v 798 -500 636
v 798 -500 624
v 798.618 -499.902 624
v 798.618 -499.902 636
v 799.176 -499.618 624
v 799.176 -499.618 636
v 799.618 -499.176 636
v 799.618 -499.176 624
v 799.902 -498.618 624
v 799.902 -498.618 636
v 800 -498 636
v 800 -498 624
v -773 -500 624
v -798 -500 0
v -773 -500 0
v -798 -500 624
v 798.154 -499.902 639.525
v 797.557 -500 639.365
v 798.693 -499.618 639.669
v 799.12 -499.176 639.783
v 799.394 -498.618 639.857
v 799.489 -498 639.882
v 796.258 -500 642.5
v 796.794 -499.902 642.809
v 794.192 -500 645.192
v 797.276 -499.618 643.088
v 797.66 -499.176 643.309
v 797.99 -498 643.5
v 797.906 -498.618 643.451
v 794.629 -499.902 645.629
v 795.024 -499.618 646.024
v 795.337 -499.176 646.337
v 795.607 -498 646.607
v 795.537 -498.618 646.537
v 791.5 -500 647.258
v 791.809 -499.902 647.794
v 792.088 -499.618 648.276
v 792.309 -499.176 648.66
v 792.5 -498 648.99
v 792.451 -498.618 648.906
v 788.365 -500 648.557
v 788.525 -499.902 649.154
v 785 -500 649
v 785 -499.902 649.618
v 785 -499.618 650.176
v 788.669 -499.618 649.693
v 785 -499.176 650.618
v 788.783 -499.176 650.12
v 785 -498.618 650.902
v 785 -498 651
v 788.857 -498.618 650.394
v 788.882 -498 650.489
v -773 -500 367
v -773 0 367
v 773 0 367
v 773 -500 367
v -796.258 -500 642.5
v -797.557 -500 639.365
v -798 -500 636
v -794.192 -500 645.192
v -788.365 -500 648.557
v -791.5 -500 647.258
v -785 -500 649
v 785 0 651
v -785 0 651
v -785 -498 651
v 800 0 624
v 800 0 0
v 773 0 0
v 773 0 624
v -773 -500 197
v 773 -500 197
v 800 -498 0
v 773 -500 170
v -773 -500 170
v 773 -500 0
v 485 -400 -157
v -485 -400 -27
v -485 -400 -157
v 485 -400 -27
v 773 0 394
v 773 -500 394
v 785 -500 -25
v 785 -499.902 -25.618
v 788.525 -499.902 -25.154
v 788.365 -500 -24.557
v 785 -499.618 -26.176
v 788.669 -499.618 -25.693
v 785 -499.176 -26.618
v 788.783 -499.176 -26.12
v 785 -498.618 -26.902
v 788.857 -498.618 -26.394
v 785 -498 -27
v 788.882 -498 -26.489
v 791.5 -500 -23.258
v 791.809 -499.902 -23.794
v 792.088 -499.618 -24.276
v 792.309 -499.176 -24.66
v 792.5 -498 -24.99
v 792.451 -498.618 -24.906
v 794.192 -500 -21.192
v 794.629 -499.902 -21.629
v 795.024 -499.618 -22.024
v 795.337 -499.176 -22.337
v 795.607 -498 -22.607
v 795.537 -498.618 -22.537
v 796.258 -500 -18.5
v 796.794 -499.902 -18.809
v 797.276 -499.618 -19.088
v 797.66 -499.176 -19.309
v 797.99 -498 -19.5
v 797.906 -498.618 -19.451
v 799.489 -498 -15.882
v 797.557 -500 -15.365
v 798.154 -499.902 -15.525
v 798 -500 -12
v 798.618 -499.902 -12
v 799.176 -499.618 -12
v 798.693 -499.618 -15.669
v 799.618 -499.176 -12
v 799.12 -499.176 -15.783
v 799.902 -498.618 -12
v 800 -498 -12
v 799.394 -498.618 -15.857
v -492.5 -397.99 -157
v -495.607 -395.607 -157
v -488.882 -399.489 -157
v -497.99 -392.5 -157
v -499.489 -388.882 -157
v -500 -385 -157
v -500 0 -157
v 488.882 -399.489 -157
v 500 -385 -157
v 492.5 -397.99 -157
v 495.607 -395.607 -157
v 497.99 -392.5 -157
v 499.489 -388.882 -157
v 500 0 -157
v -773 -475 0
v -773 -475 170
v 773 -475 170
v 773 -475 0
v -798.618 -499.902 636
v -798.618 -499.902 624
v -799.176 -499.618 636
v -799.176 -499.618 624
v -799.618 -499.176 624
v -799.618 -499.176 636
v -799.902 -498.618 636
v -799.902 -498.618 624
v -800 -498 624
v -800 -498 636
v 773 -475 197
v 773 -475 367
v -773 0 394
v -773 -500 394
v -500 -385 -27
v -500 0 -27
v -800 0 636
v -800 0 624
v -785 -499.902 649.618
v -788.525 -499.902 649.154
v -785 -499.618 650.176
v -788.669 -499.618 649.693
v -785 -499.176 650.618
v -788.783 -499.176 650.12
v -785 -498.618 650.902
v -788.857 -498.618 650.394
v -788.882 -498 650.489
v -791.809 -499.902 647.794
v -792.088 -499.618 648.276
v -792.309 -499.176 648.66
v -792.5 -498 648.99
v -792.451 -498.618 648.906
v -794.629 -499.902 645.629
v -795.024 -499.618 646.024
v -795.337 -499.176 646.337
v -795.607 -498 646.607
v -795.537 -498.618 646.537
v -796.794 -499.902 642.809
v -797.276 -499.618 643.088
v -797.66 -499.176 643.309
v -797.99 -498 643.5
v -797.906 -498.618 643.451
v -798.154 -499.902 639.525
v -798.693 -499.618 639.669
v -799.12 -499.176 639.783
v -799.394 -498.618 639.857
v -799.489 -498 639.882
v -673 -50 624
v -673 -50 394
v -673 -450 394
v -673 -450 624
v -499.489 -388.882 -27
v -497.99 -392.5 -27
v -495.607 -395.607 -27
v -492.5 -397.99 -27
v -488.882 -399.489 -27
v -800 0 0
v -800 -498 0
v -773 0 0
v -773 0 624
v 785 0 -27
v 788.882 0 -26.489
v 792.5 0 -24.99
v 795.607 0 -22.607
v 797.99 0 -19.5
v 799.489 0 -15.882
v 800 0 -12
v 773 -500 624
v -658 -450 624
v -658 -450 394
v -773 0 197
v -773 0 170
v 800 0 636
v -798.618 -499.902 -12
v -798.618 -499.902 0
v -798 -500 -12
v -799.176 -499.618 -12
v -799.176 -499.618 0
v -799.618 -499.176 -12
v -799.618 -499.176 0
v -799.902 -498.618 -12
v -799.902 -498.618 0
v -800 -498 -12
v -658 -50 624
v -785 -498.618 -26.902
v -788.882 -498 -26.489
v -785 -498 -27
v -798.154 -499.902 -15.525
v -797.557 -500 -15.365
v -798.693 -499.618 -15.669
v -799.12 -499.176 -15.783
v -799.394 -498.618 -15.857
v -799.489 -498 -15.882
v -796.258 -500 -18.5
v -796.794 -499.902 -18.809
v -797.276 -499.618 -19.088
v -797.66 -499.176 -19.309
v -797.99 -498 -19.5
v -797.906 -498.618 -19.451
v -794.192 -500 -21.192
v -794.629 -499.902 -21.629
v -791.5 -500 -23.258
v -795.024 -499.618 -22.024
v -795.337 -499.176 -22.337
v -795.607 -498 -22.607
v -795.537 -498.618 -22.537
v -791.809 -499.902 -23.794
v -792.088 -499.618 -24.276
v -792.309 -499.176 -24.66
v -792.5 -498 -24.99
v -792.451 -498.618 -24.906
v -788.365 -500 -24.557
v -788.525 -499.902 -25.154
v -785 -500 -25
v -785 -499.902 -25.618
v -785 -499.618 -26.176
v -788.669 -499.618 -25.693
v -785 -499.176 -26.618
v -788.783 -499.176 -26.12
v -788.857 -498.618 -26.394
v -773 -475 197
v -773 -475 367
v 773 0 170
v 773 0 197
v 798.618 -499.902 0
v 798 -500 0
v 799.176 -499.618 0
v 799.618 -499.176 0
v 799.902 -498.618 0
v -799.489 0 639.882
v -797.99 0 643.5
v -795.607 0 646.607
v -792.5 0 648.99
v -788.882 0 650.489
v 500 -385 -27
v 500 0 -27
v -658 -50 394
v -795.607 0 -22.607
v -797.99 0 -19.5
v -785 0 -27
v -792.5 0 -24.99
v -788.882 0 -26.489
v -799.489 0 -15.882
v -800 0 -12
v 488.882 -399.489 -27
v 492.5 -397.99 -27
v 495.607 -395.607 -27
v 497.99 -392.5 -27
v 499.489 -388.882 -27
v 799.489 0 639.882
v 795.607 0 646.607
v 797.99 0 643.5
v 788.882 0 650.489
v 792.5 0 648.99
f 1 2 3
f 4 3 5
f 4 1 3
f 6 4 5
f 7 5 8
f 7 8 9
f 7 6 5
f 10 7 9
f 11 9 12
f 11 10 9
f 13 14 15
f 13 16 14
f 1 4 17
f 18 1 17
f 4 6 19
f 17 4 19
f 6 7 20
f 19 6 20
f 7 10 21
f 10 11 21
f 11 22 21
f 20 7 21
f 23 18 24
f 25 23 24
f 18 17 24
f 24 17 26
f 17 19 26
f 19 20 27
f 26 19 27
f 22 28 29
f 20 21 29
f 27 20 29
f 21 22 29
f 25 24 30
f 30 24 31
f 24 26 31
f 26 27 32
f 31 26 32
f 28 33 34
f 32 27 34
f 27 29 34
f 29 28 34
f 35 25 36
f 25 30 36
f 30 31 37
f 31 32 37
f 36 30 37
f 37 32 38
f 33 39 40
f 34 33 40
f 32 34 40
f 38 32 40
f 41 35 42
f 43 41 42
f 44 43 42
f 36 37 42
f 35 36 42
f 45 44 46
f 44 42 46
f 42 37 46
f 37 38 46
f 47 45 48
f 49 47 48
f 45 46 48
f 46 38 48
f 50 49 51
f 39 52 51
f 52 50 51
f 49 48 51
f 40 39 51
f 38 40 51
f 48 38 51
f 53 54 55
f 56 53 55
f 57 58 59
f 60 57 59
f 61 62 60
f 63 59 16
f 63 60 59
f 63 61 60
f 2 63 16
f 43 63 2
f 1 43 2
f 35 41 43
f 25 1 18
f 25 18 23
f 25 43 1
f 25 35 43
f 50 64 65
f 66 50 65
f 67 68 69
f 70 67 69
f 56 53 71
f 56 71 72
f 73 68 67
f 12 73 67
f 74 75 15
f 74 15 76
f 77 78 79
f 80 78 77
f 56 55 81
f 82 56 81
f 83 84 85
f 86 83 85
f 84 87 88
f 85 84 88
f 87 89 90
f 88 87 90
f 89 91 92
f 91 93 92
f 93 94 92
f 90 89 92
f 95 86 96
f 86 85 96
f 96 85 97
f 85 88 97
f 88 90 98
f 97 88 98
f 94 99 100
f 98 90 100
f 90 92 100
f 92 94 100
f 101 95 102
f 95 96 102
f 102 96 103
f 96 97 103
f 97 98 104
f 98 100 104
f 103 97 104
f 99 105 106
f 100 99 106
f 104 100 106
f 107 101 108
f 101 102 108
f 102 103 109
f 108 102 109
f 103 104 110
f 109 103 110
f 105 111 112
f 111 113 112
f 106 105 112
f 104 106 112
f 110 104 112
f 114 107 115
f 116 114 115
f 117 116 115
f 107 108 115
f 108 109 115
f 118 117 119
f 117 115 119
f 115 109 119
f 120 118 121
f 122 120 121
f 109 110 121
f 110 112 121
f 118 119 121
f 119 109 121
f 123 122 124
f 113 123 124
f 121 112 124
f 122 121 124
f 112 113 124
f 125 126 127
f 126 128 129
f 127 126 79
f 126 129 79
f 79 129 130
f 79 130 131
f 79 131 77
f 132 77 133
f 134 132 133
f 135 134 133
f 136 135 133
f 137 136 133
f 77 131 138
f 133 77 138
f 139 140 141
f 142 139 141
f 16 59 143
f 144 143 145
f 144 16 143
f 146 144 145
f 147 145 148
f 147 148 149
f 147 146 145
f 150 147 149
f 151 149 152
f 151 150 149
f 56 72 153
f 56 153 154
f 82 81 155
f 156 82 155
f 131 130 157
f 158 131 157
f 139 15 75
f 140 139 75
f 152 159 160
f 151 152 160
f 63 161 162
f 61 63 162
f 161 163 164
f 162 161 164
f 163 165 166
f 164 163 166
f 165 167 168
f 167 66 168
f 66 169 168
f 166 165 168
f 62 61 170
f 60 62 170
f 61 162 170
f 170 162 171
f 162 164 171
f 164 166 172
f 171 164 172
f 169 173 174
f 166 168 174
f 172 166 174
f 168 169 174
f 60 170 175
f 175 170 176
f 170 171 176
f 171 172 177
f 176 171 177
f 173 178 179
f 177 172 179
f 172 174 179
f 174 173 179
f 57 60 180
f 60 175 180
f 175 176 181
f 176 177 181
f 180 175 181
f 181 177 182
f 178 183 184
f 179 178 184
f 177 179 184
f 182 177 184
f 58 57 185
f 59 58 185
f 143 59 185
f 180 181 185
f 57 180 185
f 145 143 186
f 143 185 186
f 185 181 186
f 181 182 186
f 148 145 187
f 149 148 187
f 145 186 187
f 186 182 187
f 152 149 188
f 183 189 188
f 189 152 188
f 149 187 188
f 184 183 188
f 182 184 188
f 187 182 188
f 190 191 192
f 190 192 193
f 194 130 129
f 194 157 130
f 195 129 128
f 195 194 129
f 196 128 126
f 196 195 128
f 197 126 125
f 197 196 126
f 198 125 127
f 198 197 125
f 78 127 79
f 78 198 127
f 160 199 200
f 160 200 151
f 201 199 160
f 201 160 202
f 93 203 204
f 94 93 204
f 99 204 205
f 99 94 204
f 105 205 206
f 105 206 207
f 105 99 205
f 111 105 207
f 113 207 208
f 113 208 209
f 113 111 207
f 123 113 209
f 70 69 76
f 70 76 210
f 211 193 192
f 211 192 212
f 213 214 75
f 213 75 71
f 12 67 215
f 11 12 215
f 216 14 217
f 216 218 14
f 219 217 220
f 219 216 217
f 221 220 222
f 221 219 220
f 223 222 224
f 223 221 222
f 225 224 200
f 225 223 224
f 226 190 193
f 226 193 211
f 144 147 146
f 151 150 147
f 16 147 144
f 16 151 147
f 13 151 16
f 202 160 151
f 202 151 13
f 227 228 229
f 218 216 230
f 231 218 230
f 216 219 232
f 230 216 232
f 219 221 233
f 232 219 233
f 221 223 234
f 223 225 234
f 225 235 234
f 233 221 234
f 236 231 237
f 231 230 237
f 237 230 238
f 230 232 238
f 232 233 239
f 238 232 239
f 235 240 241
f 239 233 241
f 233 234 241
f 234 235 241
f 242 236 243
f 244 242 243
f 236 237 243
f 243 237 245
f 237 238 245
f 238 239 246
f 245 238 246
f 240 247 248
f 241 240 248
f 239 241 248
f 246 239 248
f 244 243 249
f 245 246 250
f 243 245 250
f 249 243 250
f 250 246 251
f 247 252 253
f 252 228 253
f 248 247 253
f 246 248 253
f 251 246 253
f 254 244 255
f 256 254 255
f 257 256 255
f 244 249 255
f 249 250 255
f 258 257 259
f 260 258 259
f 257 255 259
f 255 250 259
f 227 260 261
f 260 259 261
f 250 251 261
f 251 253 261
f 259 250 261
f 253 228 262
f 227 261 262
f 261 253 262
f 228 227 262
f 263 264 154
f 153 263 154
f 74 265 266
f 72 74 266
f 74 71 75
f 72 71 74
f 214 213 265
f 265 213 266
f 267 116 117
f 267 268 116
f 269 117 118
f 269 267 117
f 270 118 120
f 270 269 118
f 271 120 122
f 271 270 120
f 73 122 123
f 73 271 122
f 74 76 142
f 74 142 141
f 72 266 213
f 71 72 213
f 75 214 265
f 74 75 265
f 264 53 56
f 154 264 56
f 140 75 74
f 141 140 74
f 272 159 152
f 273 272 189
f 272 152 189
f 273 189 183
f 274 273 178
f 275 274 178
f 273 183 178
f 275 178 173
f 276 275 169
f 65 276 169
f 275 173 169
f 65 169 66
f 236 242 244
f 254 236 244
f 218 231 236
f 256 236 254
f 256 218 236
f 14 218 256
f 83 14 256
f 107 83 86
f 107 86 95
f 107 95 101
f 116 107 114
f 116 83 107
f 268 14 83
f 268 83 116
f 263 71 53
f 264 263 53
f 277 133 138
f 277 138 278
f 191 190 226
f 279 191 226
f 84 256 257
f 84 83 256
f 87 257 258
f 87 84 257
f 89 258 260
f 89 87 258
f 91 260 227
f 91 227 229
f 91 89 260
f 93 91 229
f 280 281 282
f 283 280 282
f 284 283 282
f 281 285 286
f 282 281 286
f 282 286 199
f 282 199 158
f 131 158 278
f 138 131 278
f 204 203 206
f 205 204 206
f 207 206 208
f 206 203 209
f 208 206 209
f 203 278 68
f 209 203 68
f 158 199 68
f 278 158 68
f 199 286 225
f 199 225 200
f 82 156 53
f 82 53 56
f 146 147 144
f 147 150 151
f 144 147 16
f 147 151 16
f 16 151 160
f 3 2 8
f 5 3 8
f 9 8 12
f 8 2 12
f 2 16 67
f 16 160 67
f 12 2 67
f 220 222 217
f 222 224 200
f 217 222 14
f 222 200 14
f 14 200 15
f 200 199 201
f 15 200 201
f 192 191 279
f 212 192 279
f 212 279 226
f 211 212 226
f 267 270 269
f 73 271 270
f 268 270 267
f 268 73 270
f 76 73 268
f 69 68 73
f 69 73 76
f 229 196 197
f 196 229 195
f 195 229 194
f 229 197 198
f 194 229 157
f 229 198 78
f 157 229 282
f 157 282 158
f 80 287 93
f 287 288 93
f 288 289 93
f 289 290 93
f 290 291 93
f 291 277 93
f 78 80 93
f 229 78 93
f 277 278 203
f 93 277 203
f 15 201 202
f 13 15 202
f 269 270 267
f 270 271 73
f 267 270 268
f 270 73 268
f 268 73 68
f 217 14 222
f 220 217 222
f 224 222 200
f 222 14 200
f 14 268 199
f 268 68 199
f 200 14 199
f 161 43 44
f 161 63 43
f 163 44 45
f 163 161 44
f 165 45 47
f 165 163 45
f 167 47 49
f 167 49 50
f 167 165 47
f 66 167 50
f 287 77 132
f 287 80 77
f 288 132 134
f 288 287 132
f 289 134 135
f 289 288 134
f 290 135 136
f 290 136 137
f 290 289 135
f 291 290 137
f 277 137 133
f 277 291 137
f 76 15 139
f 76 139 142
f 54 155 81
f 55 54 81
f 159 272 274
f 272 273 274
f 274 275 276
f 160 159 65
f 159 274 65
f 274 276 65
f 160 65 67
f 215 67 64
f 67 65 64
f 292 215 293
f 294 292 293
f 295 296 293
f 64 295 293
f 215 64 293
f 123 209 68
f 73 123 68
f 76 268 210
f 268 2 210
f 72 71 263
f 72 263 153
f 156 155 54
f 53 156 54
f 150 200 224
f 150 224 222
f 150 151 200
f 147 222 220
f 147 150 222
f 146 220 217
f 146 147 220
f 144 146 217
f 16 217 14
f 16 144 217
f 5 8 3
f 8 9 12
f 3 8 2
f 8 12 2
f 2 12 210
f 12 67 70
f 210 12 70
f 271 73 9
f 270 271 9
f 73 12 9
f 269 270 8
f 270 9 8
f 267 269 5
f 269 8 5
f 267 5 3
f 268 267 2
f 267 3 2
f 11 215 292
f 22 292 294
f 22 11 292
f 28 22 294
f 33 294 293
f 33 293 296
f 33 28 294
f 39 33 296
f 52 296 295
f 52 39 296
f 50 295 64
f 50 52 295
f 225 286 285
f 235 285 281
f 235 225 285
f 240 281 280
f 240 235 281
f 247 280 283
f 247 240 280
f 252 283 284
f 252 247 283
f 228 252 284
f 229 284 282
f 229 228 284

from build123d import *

# Parameters (mm, degrees)
F13_DEPTH = 500
F10_W     = 773
F10_H     = 27
F11_W     = 800
F11_H     = 27
F12_W     = 27
F12_H     = 624
F15_W     = 1546
F15_H     = 170
F16_DEPTH = 25
F17_R     = 15
F17_2_R   = 15
F18_R     = 2
F18_2_R   = 2
F18_3_R   = 2
F18_4_R   = 2
F19_W     = 1000
F19_H     = 130
F20_DEPTH = 400
F22_START = 50
F21_W     = 15
F21_H     = 230
F22_DEPTH = 400
F23_R     = 15


with BuildPart() as f13:
    # F8 (on Front) → F13 (new body, through all)
    with BuildSketch(Plane.XZ):
        Polygon((0, 651), (-800, 651), (-800, 624), (0, 624), (800, 624), (800, 651), align=None)
    extrude(amount=F13_DEPTH)

    # F17#2
    f17_2_edges = [f13.edges().sort_by_distance(p)[0] for p in [
        (-800, -250, 651),
        (800, -250, 651),
    ]]
    fillet(f17_2_edges, radius=F17_2_R)

    # F18
    f18_edges = [f13.edges().sort_by_distance(p)[0] for p in [
        (0, -500, 651),
    ]]
    fillet(f18_edges, radius=F18_R)


with BuildPart() as f13b:
    # F9 (on Front) → F13, piece 2 (new body, through all)
    with BuildSketch(Plane.XZ):
        Polygon((-773, 394), (-773, 367), (0, 367), (773, 367), (773, 394), (0, 394), align=None)
    extrude(amount=F13_DEPTH)


with BuildPart() as f13c:
    # F10 (on Front) → F13, piece 3 (new body, through all)
    with BuildSketch(Plane.XZ):
        with Locations((-386.5, 183.5)):
            Rectangle(F10_W, F10_H)
        with Locations((386.5, 183.5)):
            Rectangle(F10_W, F10_H)
    extrude(amount=F13_DEPTH)


with BuildPart() as f13d:
    # F11 (on Front) → F13, piece 4 (new body, through all)
    with BuildSketch(Plane.XZ):
        with Locations((-400, -13.5)):
            Rectangle(F11_W, F11_H)
        with Locations((400, -13.5)):
            Rectangle(F11_W, F11_H)
    extrude(amount=F13_DEPTH)

    # F17
    f17_edges = [f13d.edges().sort_by_distance(p)[0] for p in [
        (-800, -250, -27),
        (800, -250, -27),
    ]]
    fillet(f17_edges, radius=F17_R)

    # F18#3
    f18_3_edges = [f13d.edges().sort_by_distance(p)[0] for p in [
        (0, -500, -27),
    ]]
    fillet(f18_3_edges, radius=F18_3_R)

    # F19 (on Front) → F20 (join)
    with BuildSketch(Plane.XZ):
        with Locations((0, -92)):
            Rectangle(F19_W, F19_H)
    extrude(amount=F20_DEPTH)

    # F23
    f23_edges = [f13d.edges().sort_by_distance(p)[0] for p in [
        (-500, -400, -92),
        (500, -400, -92),
    ]]
    fillet(f23_edges, radius=F23_R)


with BuildPart() as f13e:
    # F12 (on Front) → F13, piece 5 (new body, through all)
    with BuildSketch(Plane.XZ):
        with Locations((-786.5, 312)):
            Rectangle(F12_W, F12_H)
    extrude(amount=F13_DEPTH)


with BuildPart() as f14_1:
    # F14: instance of F13e
    add(f13e.part.mirror(Plane.YZ))

    # F18#4
    f18_4_edges = [f14_1.edges().sort_by_distance(p)[0] for p in [
        (800, -500, 312),
    ]]
    fillet(f18_4_edges, radius=F18_4_R)


with BuildPart() as f16:
    # F15 (on offset) → F16 (new body)
    with BuildSketch(Plane.XZ.offset(500)):
        with Locations((0, 282)):
            Rectangle(F15_W, F15_H)
    extrude(amount=-F16_DEPTH)


with BuildPart() as f16b:
    # F15 (on offset) → F16, piece 2 (new body)
    with BuildSketch(Plane.XZ.offset(500)):
        with Locations((0, 85)):
            Rectangle(F15_W, F15_H)
    extrude(amount=-F16_DEPTH)


with BuildPart() as f13e_1:
    add(f13e.part)

    # F18#2
    f18_2_edges = [f13e_1.edges().sort_by_distance(p)[0] for p in [
        (-800, -500, 312),
    ]]
    fillet(f18_2_edges, radius=F18_2_R)


with BuildPart() as f22:
    # F21 (on Front) → F22 (new body)
    with BuildSketch(Plane.XZ.offset(F22_START)):
        with Locations((-665.5, 509)):
            Rectangle(F21_W, F21_H)
    extrude(amount=F22_DEPTH)


solid = Compound([f13.part, f13b.part, f13c.part, f13d.part, f14_1.part, f16.part, f16b.part, f13e_1.part, f22.part])
